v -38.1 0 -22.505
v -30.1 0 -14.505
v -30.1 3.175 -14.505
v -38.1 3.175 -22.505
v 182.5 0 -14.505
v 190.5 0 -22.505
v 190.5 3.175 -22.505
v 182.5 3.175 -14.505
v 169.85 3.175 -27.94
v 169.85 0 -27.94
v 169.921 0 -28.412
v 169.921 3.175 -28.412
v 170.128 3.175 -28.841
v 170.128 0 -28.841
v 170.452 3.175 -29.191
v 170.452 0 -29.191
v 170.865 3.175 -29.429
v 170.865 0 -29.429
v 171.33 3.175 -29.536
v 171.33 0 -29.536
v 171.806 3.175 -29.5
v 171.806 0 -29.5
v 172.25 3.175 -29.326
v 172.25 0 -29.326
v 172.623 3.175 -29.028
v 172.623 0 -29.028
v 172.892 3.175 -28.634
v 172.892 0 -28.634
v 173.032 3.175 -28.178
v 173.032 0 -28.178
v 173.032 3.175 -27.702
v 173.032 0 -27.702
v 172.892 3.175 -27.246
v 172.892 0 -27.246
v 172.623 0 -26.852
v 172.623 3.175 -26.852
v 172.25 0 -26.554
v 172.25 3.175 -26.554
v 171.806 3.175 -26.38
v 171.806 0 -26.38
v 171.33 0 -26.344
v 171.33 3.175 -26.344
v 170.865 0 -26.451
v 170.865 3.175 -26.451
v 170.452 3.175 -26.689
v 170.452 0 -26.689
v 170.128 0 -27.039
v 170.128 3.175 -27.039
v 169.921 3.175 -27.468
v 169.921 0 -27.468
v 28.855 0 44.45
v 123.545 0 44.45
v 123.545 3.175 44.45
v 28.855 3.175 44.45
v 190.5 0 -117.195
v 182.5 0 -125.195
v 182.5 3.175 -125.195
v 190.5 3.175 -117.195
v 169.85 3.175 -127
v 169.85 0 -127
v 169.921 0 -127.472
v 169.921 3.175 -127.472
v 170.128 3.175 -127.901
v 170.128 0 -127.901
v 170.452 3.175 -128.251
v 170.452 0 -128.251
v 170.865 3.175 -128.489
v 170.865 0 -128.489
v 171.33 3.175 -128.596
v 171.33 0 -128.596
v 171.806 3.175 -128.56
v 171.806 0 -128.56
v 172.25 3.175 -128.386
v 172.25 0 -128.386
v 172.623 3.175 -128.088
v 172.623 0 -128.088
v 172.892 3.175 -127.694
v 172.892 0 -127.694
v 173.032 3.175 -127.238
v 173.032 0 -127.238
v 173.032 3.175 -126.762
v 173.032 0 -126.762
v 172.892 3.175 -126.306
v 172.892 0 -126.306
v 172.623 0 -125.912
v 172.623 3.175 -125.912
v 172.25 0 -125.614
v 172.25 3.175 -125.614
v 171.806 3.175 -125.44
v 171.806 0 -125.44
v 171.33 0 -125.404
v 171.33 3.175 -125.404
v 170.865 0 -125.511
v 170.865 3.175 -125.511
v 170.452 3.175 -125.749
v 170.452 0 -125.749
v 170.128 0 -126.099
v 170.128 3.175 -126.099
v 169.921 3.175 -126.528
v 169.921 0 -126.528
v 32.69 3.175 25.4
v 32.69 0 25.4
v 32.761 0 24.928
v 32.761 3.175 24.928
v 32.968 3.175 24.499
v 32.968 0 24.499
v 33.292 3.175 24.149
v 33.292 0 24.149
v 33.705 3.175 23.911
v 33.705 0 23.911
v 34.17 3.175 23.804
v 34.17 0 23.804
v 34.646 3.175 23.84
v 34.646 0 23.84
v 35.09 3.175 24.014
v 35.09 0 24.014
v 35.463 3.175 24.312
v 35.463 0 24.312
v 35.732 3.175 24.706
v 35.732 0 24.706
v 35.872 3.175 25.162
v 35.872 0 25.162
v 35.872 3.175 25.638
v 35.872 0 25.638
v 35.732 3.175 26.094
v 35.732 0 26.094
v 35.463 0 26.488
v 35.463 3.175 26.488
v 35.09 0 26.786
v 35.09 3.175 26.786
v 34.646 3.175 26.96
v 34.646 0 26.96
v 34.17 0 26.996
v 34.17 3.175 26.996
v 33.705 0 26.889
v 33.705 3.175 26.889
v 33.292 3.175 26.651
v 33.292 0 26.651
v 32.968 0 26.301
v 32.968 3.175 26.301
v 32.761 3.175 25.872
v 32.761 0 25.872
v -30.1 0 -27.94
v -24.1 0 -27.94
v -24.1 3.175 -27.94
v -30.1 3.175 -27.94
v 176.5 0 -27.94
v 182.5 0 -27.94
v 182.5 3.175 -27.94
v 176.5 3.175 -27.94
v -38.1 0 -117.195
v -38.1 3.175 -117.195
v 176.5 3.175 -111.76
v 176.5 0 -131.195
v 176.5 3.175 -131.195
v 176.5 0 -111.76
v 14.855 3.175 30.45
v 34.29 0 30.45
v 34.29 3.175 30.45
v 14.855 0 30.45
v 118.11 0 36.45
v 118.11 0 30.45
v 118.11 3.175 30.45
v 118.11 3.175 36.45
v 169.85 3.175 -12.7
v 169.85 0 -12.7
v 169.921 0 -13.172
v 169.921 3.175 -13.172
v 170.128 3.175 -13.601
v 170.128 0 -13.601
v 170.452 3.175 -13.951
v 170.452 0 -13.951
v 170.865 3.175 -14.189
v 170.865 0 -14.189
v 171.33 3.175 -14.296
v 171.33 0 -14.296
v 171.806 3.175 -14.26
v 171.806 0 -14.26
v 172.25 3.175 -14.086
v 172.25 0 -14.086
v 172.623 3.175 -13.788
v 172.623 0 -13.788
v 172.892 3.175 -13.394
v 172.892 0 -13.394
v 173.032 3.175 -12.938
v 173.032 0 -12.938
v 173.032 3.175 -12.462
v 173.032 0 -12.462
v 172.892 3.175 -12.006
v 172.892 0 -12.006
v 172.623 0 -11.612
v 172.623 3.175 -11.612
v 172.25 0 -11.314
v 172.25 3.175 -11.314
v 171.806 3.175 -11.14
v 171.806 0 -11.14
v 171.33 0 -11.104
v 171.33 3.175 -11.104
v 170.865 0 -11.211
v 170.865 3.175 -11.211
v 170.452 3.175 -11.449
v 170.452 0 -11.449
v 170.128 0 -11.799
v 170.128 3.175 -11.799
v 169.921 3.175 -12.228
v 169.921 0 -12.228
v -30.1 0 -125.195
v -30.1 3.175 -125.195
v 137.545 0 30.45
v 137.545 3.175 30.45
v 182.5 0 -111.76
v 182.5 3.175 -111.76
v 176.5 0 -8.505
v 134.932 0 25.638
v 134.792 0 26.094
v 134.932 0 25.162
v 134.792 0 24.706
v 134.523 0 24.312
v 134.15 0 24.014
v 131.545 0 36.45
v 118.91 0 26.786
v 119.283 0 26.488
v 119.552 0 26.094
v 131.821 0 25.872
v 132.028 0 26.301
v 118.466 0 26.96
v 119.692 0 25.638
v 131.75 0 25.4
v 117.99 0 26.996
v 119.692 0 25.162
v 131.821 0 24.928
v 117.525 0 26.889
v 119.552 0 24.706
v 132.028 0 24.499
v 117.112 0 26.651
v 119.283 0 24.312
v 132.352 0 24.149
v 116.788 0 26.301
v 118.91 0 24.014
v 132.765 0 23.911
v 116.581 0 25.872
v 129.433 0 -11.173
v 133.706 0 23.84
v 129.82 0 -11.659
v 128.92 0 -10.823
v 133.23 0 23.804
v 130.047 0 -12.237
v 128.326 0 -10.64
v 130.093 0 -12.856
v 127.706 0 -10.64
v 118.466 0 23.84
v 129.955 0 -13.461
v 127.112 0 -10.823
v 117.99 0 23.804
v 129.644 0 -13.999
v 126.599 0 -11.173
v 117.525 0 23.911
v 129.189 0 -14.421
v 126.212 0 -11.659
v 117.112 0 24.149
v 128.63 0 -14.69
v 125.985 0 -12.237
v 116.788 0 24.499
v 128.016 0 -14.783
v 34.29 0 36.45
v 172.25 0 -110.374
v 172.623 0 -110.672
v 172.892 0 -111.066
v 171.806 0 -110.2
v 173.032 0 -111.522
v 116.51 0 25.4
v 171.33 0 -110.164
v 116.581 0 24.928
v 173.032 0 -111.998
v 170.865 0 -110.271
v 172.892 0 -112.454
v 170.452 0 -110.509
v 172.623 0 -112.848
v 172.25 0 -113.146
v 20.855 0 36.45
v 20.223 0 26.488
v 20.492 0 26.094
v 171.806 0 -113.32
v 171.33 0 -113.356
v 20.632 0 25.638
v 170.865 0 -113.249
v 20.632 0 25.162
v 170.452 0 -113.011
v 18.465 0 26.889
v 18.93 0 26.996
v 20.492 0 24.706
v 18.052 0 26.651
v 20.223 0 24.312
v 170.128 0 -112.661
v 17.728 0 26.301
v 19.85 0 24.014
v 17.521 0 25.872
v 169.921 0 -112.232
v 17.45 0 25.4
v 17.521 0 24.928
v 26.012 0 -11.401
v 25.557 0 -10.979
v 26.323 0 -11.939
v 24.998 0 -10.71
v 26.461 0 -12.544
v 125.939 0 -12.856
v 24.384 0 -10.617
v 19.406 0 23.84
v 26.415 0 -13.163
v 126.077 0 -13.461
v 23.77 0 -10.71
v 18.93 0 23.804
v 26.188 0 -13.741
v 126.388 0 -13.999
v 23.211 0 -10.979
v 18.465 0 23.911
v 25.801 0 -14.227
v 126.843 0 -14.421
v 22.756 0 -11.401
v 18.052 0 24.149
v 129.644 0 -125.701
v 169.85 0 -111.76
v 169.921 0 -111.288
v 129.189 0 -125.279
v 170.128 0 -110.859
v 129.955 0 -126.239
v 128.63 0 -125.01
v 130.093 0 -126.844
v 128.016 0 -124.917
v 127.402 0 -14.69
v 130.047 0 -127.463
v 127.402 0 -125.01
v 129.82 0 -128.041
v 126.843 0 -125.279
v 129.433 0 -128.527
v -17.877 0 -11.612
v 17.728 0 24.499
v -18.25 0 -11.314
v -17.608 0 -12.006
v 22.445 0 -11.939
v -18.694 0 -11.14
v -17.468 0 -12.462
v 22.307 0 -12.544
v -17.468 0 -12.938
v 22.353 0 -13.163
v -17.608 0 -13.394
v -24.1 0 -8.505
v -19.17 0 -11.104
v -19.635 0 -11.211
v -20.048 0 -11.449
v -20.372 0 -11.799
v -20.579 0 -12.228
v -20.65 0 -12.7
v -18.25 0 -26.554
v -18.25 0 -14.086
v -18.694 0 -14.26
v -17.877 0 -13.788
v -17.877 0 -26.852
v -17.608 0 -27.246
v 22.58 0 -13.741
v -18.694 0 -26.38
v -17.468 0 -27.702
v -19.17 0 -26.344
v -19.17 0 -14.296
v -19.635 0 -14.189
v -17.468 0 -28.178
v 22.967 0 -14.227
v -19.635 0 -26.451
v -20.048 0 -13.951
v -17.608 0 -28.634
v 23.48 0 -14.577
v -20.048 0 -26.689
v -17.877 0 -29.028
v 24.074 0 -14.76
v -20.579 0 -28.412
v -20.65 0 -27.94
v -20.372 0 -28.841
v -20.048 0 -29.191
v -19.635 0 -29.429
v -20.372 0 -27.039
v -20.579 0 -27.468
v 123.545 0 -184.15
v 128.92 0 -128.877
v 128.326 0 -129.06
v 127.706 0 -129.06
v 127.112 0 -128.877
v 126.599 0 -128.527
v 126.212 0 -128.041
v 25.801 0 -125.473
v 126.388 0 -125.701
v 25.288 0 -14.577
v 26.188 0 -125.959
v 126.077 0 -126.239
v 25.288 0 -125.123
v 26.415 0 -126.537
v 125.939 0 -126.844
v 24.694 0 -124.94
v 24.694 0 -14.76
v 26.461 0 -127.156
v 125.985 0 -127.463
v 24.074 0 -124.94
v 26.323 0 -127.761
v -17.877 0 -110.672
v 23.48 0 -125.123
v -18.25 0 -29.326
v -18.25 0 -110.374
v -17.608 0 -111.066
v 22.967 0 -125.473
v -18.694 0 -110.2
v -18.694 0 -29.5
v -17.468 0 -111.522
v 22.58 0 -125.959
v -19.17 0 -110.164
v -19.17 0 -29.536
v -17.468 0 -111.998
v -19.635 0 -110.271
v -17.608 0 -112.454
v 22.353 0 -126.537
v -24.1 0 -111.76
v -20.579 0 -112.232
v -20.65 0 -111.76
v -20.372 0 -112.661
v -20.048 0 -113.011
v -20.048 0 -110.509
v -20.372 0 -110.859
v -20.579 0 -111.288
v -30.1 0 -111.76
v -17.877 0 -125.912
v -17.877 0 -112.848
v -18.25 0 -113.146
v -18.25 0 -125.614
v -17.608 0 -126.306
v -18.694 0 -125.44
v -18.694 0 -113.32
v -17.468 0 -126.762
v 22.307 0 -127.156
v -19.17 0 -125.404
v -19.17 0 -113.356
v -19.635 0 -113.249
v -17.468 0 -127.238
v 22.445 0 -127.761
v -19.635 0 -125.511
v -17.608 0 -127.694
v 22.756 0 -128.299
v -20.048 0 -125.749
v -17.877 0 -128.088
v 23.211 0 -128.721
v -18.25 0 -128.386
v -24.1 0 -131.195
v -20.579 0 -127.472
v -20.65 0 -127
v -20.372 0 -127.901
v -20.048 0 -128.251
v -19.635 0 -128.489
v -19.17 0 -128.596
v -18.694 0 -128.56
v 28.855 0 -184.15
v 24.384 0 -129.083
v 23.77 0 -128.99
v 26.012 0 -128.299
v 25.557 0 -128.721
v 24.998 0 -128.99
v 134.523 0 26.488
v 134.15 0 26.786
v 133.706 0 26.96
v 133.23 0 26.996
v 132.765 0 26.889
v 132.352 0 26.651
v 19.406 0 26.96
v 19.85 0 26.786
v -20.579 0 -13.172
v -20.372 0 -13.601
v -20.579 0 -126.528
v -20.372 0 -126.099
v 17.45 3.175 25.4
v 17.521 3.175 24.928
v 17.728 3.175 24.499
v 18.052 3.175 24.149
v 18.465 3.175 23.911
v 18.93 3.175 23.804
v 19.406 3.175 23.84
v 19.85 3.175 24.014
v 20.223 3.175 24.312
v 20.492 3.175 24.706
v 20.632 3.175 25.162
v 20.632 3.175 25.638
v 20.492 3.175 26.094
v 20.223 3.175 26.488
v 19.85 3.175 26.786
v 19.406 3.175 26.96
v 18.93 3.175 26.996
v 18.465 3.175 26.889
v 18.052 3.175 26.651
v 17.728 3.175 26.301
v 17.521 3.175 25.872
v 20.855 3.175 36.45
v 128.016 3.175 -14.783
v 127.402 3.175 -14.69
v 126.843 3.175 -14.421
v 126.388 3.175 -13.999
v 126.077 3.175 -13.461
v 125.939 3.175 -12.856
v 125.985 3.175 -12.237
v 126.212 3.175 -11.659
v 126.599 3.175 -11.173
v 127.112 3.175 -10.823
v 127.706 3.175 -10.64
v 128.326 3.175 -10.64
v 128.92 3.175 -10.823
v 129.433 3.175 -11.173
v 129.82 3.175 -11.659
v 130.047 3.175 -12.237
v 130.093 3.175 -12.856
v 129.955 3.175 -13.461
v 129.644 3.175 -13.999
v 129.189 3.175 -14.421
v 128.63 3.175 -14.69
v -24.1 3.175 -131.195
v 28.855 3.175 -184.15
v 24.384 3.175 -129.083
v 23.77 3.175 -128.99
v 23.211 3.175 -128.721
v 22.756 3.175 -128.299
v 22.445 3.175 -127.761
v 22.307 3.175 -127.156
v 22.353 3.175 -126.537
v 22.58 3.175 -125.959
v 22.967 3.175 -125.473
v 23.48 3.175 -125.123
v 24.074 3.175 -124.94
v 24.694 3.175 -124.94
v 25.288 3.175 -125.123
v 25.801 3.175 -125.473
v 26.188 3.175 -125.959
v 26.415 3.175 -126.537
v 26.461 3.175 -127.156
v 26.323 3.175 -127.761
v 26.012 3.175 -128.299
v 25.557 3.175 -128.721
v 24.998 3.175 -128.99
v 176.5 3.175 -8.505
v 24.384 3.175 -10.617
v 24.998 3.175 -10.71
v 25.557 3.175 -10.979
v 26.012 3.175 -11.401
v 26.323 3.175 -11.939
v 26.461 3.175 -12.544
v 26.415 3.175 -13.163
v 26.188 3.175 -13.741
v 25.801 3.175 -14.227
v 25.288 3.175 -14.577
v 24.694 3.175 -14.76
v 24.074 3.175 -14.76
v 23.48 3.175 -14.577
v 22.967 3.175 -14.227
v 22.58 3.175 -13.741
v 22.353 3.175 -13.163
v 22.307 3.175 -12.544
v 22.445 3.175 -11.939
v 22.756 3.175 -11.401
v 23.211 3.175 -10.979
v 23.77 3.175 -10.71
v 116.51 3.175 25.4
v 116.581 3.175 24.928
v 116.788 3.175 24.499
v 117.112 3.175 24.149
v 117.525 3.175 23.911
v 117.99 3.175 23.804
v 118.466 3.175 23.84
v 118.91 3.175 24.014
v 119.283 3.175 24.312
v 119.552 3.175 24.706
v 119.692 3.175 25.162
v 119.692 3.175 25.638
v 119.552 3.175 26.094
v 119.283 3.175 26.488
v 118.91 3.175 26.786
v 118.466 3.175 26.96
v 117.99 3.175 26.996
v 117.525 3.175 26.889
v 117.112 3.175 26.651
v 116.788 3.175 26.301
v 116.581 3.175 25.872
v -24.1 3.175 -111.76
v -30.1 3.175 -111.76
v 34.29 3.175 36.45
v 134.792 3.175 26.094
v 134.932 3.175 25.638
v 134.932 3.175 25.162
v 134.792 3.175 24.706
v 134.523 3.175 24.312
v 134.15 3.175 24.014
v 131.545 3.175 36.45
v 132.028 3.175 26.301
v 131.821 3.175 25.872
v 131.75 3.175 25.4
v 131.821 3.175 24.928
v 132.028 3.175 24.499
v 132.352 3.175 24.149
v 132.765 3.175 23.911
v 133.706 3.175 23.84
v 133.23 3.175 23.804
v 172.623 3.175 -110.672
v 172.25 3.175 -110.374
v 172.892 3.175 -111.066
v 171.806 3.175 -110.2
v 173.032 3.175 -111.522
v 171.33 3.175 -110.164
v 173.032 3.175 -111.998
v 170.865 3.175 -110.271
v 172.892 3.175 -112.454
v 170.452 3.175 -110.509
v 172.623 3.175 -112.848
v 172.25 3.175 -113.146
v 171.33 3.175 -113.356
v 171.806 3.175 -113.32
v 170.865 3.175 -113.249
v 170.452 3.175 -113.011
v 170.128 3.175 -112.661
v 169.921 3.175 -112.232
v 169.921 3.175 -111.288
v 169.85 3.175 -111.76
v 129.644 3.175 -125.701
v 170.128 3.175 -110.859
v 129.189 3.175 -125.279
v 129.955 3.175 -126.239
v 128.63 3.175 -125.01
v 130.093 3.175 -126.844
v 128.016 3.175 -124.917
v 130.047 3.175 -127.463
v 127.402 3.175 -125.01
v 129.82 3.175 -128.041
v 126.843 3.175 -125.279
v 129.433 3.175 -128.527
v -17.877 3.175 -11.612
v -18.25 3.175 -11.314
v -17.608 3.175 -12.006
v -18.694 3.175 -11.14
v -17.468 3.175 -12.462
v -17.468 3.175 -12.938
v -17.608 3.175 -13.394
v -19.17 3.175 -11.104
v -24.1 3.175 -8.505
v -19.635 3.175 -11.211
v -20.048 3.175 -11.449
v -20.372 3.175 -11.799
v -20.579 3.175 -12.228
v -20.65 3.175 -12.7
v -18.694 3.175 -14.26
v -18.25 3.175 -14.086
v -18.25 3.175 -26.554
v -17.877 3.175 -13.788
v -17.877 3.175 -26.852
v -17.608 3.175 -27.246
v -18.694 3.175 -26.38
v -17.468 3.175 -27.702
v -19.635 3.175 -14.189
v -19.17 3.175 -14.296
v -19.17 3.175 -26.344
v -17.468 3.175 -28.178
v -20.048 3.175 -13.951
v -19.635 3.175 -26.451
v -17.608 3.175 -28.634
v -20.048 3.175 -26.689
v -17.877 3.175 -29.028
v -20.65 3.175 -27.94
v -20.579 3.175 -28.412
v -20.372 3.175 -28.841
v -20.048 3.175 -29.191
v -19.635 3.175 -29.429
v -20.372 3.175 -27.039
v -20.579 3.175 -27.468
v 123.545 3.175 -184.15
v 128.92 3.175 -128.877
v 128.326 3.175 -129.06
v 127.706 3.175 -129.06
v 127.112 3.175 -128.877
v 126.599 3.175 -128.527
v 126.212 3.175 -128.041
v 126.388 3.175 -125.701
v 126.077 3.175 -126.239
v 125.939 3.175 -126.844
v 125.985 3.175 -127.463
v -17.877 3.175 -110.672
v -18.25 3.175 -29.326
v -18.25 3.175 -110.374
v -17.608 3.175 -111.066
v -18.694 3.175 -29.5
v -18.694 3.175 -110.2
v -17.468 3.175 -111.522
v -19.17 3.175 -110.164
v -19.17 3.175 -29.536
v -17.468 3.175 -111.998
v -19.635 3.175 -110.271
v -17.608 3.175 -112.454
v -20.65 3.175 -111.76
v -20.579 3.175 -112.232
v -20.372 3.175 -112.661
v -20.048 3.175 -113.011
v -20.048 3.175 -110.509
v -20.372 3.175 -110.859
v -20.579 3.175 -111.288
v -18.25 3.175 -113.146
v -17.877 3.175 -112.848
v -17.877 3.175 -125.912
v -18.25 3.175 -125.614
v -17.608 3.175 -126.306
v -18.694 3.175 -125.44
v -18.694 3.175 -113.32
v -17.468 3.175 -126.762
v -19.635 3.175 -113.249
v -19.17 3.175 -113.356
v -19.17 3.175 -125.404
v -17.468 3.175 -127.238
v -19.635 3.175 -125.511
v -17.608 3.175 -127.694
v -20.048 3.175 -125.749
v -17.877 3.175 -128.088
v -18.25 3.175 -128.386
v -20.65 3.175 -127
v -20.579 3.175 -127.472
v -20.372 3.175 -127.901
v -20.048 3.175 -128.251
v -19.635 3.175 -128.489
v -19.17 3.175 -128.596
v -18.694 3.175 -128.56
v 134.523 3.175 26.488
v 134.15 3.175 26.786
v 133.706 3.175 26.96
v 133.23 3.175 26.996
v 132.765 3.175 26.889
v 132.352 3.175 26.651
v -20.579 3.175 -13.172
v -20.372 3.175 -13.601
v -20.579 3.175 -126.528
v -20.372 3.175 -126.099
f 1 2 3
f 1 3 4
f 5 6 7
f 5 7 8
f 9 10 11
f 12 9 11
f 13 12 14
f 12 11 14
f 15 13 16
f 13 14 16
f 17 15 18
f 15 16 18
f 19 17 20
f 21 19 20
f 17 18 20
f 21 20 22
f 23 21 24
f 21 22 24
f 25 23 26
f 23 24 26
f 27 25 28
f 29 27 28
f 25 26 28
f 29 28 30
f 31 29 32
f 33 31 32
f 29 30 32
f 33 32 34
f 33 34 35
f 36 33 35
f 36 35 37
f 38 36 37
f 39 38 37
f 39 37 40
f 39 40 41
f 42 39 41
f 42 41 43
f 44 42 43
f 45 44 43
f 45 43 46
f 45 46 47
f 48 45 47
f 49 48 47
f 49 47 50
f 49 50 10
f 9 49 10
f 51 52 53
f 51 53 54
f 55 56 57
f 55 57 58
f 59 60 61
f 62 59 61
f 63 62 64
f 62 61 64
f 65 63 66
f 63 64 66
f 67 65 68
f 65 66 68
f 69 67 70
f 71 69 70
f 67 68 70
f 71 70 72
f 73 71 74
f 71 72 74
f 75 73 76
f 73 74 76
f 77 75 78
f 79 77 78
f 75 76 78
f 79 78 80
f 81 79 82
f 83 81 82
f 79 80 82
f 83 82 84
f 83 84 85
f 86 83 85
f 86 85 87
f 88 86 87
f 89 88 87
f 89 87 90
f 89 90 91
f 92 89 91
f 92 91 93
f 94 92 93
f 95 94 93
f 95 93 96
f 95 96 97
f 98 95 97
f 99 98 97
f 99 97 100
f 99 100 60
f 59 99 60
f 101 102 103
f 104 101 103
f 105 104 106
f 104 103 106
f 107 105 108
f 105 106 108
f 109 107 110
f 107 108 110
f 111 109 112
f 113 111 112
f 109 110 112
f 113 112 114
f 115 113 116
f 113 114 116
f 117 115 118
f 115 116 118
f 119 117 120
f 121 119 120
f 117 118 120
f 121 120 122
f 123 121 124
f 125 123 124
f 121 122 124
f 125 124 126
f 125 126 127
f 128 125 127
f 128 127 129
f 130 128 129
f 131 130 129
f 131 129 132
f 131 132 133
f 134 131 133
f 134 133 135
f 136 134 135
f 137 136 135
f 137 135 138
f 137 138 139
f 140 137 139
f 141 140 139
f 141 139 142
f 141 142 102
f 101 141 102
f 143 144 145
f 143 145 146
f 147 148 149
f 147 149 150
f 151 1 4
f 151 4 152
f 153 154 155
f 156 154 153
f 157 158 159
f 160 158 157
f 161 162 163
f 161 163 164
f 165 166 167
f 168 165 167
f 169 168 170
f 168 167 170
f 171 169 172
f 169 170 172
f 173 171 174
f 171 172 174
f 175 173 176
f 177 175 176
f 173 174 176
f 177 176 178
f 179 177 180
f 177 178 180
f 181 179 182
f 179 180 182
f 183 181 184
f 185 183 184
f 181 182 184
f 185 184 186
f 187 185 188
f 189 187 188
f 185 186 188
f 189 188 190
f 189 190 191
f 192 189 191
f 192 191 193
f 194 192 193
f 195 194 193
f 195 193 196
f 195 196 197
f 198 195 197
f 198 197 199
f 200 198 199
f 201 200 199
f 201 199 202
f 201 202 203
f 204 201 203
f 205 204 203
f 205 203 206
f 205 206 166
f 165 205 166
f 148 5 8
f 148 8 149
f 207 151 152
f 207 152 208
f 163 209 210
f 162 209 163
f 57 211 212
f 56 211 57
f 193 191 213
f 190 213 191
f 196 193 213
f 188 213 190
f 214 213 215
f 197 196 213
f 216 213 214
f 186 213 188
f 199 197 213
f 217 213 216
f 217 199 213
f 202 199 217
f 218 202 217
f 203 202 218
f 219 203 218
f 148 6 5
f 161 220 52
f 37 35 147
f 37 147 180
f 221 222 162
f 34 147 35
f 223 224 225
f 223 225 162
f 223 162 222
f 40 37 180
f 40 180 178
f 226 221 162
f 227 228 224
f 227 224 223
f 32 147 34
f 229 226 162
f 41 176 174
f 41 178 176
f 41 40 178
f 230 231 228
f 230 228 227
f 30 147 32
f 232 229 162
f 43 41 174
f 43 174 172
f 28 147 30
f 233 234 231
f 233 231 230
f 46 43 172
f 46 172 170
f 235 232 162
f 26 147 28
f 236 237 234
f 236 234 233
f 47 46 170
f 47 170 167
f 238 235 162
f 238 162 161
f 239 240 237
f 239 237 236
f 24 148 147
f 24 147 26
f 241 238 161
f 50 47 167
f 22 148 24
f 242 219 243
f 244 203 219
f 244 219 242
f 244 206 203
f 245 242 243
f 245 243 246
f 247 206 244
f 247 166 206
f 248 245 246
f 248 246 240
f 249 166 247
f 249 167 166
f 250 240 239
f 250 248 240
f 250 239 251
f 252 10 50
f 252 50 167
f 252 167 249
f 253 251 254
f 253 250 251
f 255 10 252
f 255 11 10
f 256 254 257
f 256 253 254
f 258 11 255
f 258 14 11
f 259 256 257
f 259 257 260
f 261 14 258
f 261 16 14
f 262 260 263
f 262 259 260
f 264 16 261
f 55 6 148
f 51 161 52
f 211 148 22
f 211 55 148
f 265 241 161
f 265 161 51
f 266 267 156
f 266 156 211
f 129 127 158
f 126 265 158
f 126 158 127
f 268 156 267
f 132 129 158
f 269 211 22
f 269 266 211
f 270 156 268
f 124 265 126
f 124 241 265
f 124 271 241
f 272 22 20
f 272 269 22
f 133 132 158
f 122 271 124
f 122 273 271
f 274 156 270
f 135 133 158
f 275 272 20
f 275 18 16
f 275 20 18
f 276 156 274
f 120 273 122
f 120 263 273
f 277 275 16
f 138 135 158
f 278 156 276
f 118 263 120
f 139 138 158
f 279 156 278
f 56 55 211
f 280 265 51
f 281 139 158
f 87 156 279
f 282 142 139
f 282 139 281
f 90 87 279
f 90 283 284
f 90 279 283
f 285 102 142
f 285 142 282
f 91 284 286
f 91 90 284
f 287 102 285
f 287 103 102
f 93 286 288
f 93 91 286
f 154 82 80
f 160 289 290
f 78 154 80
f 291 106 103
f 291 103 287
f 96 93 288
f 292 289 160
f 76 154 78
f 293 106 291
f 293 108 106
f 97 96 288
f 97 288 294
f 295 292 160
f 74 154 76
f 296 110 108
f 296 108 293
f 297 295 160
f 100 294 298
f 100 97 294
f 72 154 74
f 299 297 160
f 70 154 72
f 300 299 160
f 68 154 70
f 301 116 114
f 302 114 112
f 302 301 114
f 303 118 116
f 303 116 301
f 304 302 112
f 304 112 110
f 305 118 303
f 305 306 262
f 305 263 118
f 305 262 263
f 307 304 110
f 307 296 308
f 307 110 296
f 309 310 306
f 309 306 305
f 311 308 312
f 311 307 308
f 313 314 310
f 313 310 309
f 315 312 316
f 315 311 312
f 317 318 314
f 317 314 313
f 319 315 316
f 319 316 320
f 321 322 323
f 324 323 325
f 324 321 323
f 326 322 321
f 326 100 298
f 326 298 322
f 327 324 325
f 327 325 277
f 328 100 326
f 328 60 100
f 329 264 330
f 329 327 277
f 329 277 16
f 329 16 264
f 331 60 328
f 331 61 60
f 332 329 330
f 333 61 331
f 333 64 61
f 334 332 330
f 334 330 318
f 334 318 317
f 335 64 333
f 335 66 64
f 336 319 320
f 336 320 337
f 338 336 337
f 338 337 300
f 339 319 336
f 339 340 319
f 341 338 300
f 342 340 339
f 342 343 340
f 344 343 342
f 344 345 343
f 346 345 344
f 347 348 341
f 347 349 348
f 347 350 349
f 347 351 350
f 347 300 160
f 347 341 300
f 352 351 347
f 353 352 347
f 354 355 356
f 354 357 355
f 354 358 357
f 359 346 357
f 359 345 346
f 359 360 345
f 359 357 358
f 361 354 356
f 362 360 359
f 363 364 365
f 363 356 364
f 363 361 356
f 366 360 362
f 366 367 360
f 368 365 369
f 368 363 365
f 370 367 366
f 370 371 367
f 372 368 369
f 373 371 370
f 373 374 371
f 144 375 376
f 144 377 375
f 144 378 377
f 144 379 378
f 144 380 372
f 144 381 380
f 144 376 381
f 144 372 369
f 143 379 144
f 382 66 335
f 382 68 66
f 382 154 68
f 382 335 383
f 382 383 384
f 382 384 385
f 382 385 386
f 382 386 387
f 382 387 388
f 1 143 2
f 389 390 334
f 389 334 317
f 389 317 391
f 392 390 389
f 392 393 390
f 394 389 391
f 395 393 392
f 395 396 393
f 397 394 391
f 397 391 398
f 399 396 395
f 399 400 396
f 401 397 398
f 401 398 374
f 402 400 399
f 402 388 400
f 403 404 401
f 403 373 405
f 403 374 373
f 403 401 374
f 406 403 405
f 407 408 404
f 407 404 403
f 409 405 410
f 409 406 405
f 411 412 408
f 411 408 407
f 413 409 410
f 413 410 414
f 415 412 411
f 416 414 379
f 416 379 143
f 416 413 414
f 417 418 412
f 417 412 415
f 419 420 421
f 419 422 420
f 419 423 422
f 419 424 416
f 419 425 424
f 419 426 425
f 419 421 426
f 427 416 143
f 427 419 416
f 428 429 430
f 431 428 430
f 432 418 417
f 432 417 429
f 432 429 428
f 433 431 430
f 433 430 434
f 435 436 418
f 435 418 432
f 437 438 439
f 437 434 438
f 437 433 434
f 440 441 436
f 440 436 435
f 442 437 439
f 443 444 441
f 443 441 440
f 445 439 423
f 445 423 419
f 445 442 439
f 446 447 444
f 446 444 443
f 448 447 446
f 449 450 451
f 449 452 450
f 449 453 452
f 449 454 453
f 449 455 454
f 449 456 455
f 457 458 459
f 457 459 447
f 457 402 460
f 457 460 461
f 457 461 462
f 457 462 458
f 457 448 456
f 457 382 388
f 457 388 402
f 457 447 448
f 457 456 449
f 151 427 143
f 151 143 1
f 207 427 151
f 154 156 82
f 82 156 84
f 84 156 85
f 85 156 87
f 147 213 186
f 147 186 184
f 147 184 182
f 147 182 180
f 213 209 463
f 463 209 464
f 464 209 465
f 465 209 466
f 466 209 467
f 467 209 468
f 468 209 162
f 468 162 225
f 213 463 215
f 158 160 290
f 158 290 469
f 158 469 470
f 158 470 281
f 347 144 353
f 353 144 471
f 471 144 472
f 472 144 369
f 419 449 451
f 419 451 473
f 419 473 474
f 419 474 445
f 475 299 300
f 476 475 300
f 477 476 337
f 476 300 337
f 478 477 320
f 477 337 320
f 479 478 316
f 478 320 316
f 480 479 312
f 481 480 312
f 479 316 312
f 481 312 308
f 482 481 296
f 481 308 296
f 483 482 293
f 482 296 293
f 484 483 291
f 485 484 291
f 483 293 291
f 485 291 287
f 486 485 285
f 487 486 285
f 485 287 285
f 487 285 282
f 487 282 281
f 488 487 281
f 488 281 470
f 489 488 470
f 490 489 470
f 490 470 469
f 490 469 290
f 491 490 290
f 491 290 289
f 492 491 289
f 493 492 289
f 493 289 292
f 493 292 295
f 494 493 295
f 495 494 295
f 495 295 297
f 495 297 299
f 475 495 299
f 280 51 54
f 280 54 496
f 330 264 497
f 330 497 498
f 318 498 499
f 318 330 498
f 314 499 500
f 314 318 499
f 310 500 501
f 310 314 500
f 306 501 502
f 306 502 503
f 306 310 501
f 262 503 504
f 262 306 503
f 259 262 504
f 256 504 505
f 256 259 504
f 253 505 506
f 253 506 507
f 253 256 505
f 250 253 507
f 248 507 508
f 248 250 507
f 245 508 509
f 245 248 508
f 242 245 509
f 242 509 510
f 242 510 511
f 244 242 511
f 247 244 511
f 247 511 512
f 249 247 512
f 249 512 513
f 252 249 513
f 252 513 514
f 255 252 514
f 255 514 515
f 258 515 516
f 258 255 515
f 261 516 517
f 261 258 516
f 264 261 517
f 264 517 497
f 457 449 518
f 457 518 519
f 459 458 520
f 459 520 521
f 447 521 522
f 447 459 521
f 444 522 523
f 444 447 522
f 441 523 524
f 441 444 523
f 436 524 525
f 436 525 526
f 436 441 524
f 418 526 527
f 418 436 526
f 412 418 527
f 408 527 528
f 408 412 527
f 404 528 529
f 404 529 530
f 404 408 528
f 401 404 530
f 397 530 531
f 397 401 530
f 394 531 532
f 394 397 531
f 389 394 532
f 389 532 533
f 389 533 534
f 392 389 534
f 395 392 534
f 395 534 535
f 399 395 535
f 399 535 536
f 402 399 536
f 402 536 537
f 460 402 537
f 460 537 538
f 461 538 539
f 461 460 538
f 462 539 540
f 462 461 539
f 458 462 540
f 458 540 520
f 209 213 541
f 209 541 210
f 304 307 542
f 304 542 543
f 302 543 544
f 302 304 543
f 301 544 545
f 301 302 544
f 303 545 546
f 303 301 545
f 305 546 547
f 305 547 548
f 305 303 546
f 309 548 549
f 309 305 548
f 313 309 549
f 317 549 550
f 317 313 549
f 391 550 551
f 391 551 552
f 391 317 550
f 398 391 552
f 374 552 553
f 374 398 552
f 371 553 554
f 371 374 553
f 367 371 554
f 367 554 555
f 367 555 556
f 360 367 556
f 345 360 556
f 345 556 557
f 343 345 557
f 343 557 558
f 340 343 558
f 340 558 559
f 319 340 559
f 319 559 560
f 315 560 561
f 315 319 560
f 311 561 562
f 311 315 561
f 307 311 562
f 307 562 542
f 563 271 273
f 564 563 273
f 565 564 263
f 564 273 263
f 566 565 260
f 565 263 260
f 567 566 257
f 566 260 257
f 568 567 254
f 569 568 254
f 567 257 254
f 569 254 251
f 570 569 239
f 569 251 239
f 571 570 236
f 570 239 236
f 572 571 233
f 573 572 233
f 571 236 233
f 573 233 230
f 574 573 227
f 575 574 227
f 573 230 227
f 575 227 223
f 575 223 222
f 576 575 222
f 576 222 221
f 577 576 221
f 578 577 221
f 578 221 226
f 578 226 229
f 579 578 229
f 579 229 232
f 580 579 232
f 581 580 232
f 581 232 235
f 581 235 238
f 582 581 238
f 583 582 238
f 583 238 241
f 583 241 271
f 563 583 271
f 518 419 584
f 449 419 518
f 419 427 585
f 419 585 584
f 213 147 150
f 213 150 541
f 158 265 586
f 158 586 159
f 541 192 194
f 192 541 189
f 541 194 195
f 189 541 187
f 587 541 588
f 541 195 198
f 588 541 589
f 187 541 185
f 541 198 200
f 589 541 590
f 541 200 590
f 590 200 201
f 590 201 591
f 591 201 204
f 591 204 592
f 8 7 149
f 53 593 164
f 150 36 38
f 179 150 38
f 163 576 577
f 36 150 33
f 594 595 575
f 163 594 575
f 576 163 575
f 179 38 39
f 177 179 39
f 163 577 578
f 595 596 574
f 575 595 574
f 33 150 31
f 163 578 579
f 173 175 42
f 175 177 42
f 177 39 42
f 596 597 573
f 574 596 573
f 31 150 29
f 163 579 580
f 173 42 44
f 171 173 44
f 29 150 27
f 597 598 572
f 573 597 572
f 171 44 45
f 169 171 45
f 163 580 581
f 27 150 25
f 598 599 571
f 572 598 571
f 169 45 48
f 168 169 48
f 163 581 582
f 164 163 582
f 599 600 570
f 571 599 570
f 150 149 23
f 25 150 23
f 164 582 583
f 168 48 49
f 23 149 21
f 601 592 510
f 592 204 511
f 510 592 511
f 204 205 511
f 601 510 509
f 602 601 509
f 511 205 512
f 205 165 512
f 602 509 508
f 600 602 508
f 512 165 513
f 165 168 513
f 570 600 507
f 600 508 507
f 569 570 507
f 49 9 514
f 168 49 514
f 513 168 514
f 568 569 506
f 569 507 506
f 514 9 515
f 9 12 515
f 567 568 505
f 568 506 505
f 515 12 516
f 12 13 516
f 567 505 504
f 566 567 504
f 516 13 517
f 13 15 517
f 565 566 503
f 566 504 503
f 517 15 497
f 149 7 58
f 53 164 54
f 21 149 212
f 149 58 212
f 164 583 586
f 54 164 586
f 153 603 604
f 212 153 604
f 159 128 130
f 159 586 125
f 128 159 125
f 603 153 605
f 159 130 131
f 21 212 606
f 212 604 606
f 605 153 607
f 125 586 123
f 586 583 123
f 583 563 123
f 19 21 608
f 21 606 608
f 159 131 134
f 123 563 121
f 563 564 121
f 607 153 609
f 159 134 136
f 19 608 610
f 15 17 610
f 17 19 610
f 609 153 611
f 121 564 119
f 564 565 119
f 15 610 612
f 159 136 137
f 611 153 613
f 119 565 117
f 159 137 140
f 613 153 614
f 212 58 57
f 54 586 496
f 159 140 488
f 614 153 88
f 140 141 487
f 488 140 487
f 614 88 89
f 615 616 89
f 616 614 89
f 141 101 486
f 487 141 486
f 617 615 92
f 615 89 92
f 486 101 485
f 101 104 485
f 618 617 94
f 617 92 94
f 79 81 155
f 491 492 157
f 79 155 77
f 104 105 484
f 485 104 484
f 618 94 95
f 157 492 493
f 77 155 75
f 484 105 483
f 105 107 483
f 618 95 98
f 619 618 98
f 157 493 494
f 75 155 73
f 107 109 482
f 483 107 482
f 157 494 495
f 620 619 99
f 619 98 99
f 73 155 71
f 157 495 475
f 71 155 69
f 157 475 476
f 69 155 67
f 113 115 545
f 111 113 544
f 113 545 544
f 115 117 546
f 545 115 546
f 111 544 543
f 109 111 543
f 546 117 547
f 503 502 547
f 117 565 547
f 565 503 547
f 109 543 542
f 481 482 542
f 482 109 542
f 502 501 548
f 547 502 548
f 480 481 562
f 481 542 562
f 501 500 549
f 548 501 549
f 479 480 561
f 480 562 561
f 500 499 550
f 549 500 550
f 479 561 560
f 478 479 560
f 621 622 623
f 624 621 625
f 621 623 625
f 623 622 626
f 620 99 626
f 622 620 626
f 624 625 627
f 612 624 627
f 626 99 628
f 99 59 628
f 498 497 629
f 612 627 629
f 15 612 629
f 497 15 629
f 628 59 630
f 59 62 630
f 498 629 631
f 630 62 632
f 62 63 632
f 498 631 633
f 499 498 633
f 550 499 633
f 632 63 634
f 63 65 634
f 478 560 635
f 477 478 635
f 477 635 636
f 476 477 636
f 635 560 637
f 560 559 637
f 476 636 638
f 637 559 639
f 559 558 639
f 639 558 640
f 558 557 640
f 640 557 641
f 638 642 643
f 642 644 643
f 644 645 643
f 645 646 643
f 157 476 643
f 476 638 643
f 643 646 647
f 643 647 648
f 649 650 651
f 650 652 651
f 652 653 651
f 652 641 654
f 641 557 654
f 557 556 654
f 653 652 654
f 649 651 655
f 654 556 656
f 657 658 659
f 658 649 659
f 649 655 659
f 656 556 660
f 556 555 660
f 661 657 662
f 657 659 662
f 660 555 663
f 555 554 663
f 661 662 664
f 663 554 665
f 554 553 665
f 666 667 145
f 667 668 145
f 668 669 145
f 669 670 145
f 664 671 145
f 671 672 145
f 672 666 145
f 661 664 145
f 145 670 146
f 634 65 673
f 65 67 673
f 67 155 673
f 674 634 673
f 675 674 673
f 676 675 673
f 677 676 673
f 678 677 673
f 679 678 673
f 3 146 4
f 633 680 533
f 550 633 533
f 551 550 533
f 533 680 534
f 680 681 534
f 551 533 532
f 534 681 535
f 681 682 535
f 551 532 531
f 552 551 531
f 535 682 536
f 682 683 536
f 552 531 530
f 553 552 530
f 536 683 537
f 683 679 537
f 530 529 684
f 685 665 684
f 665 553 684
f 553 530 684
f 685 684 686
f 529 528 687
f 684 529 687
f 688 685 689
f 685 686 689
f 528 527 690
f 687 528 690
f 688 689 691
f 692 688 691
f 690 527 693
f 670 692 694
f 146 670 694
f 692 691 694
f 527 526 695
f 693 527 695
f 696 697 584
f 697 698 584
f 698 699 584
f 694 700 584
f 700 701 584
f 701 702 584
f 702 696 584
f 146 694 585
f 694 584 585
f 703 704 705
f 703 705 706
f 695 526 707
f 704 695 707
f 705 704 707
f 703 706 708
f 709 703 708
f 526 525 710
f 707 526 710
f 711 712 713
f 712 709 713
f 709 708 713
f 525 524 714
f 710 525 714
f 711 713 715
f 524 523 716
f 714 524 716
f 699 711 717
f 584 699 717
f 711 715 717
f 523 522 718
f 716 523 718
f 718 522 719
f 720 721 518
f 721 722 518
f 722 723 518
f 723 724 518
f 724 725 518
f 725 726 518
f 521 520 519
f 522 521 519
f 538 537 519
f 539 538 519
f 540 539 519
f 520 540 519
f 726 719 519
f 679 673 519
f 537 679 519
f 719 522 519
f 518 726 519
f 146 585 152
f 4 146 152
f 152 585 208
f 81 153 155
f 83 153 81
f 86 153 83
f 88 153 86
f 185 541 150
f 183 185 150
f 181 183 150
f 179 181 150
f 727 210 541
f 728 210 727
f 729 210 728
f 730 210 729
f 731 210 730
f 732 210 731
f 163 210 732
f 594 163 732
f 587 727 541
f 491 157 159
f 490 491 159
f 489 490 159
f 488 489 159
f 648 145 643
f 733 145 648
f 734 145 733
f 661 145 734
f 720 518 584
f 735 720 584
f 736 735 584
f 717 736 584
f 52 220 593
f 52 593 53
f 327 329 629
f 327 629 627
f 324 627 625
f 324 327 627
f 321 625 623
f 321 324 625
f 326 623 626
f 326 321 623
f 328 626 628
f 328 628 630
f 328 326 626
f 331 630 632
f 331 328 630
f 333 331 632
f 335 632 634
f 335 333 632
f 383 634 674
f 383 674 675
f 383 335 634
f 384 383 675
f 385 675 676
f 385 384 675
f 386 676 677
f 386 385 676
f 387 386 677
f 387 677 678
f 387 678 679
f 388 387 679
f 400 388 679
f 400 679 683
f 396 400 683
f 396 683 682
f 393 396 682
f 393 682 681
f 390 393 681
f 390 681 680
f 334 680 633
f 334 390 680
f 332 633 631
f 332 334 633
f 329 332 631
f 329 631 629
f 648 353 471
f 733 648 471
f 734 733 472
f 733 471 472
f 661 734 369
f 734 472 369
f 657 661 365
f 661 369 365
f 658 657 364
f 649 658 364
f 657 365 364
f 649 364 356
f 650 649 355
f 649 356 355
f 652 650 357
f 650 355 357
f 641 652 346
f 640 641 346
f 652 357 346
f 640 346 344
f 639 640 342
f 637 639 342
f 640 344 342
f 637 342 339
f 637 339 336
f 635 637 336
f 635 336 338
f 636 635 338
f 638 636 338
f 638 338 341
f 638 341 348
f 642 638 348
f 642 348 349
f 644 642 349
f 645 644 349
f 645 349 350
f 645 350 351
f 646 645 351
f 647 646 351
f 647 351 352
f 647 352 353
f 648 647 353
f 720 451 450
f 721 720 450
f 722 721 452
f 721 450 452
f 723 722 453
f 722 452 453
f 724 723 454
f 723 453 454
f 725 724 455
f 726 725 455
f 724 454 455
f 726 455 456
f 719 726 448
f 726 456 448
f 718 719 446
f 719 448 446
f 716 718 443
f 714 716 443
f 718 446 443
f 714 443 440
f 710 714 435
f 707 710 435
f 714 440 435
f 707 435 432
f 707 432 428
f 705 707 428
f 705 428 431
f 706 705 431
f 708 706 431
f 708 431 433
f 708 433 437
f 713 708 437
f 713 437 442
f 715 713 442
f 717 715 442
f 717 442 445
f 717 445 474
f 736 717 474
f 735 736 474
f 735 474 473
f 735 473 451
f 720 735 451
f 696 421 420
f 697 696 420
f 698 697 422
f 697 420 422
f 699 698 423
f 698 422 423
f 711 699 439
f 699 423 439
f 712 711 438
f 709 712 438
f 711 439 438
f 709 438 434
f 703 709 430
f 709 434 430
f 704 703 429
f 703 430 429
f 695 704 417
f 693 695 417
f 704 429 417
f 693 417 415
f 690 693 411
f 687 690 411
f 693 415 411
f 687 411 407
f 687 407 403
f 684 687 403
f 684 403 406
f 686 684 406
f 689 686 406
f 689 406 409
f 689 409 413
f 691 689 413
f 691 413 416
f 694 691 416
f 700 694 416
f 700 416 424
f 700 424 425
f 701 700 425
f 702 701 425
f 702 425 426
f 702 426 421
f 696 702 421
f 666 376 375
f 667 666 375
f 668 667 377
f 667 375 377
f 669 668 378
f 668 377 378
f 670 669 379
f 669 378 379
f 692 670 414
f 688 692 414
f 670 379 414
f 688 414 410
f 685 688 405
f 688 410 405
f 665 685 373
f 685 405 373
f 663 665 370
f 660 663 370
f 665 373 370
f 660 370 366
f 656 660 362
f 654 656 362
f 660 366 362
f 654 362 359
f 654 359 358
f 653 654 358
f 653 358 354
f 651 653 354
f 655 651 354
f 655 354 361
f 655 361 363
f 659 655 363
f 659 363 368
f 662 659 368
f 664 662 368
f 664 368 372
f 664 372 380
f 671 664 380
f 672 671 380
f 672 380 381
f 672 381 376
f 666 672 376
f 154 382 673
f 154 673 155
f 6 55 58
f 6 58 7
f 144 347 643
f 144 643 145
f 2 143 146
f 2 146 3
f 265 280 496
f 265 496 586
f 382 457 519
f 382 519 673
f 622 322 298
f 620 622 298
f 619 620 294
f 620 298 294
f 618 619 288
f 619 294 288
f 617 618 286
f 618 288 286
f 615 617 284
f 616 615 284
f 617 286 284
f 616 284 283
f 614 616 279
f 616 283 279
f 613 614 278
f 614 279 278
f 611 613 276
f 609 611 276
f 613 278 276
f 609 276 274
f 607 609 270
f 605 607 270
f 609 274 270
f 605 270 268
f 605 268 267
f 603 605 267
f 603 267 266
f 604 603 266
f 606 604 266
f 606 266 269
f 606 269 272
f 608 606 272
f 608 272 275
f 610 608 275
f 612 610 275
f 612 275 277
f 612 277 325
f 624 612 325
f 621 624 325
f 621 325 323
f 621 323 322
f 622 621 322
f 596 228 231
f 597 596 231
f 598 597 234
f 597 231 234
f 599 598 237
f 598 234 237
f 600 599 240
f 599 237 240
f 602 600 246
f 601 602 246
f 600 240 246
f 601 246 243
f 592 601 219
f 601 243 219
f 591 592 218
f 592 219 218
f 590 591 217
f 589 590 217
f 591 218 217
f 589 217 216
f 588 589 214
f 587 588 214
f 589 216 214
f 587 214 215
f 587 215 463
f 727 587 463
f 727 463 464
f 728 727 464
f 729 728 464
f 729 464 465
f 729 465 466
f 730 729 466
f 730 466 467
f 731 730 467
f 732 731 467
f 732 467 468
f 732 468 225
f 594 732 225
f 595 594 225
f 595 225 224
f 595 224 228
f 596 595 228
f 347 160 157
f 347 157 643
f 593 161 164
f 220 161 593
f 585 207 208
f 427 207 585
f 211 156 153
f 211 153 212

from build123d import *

# Parameters (mm, degrees)
SKETCH1_R            = 2.0828
BOSS_EXTRUDE1_DEPTH  = 3.175
M3_CLEARANCE_HOLE1_D = 3.2


with BuildPart() as part:
    # Sketch1 → Boss-Extrude1 (new body)
    with BuildSketch(Plane(origin=(0, 0, 0), x_dir=(1, 0, 0), z_dir=(0, 1, 0))):
        Polygon((28.855389821, 184.15), (123.544610179, 184.15), (176.5, 131.194610179), (176.5, 111.76), (182.5, 111.76), (182.5, 125.194610179), (190.5, 117.194610179), (190.5, 22.505389821), (182.5, 14.505389821), (182.5, 27.94), (176.5, 27.94), (176.5, 8.505389821), (137.544610179, -30.45), (118.11, -30.45), (118.11, -36.45), (131.544610179, -36.45), (123.544610179, -44.45), (28.855389821, -44.45), (20.855389821, -36.45), (34.29, -36.45), (34.29, -30.45), (14.855389821, -30.45), (-24.1, 8.505389821), (-24.1, 27.94), (-30.1, 27.94), (-30.1, 14.505389821), (-38.1, 22.505389821), (-38.1, 117.194610179), (-30.1, 125.194610179), (-30.1, 111.76), (-24.1, 111.76), (-24.1, 131.194610179), align=None)
        with Locations(Location((24.384, 12.7, 0), (0, 0, 270))):
            Circle(SKETCH1_R, mode=Mode.SUBTRACT)
        with Locations(Location((128.016, 12.7, 0), (0, 0, 90))):
            Circle(SKETCH1_R, mode=Mode.SUBTRACT)
        with Locations(Location((128.016, 127, 0), (0, 0, 270))):
            Circle(SKETCH1_R, mode=Mode.SUBTRACT)
        with Locations(Location((24.384, 127, 0), (0, 0, 90))):
            Circle(SKETCH1_R, mode=Mode.SUBTRACT)
    extrude(amount=BOSS_EXTRUDE1_DEPTH)

    # M3 Clearance Hole1 (through all)
    with Locations(Plane(origin=(0, 3.175, 0), x_dir=(1, 0, 0), z_dir=(0, 1, 0))):
        with Locations((-19.05, 127), (-19.05, 111.76), (-19.05, 27.94), (-19.05, 12.7), (171.45, 127), (171.45, 111.76), (171.45, 27.94), (171.45, 12.7), (133.35, -25.4), (118.11, -25.4), (34.29, -25.4), (19.05, -25.4)):
            Hole(M3_CLEARANCE_HOLE1_D / 2)


solid = part.part
